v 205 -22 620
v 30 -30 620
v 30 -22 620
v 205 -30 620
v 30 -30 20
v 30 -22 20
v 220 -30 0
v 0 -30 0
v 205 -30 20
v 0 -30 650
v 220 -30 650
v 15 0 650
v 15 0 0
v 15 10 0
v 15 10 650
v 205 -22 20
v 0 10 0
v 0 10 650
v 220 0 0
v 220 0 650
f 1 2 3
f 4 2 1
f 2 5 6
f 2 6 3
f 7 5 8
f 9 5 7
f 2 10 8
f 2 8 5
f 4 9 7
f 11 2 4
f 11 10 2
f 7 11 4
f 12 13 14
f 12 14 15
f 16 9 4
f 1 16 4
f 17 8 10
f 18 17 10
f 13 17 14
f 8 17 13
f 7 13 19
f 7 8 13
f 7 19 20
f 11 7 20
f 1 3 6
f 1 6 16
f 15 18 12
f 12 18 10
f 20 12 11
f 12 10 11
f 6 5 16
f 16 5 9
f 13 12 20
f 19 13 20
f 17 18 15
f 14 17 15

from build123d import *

# Parameters (mm, degrees)
F0_W     = 220
F0_H     = 650
F1_DEPTH = 30
F2_W     = 175
F2_H     = 600
F3_DEPTH = 8
F4_W     = 15
F4_H     = 650
F5_DEPTH = 10


with BuildPart() as f1:
    # F0 (on Front) → F1 (new body)
    with BuildSketch(Plane.XZ):
        with Locations((110, 325)):
            Rectangle(F0_W, F0_H)
    extrude(amount=F1_DEPTH)

    # F2 (on face) → F3 (cut)
    with BuildSketch(Plane.XZ.offset(30)):
        with Locations((117.5, 320)):
            Rectangle(F2_W, F2_H)
    extrude(amount=-F3_DEPTH, mode=Mode.SUBTRACT)

    # F4 (on face) → F5 (join)
    with BuildSketch(Plane.XZ):
        with Locations((7.5, 325)):
            Rectangle(F4_W, F4_H)
    extrude(amount=-F5_DEPTH)


solid = f1.part
